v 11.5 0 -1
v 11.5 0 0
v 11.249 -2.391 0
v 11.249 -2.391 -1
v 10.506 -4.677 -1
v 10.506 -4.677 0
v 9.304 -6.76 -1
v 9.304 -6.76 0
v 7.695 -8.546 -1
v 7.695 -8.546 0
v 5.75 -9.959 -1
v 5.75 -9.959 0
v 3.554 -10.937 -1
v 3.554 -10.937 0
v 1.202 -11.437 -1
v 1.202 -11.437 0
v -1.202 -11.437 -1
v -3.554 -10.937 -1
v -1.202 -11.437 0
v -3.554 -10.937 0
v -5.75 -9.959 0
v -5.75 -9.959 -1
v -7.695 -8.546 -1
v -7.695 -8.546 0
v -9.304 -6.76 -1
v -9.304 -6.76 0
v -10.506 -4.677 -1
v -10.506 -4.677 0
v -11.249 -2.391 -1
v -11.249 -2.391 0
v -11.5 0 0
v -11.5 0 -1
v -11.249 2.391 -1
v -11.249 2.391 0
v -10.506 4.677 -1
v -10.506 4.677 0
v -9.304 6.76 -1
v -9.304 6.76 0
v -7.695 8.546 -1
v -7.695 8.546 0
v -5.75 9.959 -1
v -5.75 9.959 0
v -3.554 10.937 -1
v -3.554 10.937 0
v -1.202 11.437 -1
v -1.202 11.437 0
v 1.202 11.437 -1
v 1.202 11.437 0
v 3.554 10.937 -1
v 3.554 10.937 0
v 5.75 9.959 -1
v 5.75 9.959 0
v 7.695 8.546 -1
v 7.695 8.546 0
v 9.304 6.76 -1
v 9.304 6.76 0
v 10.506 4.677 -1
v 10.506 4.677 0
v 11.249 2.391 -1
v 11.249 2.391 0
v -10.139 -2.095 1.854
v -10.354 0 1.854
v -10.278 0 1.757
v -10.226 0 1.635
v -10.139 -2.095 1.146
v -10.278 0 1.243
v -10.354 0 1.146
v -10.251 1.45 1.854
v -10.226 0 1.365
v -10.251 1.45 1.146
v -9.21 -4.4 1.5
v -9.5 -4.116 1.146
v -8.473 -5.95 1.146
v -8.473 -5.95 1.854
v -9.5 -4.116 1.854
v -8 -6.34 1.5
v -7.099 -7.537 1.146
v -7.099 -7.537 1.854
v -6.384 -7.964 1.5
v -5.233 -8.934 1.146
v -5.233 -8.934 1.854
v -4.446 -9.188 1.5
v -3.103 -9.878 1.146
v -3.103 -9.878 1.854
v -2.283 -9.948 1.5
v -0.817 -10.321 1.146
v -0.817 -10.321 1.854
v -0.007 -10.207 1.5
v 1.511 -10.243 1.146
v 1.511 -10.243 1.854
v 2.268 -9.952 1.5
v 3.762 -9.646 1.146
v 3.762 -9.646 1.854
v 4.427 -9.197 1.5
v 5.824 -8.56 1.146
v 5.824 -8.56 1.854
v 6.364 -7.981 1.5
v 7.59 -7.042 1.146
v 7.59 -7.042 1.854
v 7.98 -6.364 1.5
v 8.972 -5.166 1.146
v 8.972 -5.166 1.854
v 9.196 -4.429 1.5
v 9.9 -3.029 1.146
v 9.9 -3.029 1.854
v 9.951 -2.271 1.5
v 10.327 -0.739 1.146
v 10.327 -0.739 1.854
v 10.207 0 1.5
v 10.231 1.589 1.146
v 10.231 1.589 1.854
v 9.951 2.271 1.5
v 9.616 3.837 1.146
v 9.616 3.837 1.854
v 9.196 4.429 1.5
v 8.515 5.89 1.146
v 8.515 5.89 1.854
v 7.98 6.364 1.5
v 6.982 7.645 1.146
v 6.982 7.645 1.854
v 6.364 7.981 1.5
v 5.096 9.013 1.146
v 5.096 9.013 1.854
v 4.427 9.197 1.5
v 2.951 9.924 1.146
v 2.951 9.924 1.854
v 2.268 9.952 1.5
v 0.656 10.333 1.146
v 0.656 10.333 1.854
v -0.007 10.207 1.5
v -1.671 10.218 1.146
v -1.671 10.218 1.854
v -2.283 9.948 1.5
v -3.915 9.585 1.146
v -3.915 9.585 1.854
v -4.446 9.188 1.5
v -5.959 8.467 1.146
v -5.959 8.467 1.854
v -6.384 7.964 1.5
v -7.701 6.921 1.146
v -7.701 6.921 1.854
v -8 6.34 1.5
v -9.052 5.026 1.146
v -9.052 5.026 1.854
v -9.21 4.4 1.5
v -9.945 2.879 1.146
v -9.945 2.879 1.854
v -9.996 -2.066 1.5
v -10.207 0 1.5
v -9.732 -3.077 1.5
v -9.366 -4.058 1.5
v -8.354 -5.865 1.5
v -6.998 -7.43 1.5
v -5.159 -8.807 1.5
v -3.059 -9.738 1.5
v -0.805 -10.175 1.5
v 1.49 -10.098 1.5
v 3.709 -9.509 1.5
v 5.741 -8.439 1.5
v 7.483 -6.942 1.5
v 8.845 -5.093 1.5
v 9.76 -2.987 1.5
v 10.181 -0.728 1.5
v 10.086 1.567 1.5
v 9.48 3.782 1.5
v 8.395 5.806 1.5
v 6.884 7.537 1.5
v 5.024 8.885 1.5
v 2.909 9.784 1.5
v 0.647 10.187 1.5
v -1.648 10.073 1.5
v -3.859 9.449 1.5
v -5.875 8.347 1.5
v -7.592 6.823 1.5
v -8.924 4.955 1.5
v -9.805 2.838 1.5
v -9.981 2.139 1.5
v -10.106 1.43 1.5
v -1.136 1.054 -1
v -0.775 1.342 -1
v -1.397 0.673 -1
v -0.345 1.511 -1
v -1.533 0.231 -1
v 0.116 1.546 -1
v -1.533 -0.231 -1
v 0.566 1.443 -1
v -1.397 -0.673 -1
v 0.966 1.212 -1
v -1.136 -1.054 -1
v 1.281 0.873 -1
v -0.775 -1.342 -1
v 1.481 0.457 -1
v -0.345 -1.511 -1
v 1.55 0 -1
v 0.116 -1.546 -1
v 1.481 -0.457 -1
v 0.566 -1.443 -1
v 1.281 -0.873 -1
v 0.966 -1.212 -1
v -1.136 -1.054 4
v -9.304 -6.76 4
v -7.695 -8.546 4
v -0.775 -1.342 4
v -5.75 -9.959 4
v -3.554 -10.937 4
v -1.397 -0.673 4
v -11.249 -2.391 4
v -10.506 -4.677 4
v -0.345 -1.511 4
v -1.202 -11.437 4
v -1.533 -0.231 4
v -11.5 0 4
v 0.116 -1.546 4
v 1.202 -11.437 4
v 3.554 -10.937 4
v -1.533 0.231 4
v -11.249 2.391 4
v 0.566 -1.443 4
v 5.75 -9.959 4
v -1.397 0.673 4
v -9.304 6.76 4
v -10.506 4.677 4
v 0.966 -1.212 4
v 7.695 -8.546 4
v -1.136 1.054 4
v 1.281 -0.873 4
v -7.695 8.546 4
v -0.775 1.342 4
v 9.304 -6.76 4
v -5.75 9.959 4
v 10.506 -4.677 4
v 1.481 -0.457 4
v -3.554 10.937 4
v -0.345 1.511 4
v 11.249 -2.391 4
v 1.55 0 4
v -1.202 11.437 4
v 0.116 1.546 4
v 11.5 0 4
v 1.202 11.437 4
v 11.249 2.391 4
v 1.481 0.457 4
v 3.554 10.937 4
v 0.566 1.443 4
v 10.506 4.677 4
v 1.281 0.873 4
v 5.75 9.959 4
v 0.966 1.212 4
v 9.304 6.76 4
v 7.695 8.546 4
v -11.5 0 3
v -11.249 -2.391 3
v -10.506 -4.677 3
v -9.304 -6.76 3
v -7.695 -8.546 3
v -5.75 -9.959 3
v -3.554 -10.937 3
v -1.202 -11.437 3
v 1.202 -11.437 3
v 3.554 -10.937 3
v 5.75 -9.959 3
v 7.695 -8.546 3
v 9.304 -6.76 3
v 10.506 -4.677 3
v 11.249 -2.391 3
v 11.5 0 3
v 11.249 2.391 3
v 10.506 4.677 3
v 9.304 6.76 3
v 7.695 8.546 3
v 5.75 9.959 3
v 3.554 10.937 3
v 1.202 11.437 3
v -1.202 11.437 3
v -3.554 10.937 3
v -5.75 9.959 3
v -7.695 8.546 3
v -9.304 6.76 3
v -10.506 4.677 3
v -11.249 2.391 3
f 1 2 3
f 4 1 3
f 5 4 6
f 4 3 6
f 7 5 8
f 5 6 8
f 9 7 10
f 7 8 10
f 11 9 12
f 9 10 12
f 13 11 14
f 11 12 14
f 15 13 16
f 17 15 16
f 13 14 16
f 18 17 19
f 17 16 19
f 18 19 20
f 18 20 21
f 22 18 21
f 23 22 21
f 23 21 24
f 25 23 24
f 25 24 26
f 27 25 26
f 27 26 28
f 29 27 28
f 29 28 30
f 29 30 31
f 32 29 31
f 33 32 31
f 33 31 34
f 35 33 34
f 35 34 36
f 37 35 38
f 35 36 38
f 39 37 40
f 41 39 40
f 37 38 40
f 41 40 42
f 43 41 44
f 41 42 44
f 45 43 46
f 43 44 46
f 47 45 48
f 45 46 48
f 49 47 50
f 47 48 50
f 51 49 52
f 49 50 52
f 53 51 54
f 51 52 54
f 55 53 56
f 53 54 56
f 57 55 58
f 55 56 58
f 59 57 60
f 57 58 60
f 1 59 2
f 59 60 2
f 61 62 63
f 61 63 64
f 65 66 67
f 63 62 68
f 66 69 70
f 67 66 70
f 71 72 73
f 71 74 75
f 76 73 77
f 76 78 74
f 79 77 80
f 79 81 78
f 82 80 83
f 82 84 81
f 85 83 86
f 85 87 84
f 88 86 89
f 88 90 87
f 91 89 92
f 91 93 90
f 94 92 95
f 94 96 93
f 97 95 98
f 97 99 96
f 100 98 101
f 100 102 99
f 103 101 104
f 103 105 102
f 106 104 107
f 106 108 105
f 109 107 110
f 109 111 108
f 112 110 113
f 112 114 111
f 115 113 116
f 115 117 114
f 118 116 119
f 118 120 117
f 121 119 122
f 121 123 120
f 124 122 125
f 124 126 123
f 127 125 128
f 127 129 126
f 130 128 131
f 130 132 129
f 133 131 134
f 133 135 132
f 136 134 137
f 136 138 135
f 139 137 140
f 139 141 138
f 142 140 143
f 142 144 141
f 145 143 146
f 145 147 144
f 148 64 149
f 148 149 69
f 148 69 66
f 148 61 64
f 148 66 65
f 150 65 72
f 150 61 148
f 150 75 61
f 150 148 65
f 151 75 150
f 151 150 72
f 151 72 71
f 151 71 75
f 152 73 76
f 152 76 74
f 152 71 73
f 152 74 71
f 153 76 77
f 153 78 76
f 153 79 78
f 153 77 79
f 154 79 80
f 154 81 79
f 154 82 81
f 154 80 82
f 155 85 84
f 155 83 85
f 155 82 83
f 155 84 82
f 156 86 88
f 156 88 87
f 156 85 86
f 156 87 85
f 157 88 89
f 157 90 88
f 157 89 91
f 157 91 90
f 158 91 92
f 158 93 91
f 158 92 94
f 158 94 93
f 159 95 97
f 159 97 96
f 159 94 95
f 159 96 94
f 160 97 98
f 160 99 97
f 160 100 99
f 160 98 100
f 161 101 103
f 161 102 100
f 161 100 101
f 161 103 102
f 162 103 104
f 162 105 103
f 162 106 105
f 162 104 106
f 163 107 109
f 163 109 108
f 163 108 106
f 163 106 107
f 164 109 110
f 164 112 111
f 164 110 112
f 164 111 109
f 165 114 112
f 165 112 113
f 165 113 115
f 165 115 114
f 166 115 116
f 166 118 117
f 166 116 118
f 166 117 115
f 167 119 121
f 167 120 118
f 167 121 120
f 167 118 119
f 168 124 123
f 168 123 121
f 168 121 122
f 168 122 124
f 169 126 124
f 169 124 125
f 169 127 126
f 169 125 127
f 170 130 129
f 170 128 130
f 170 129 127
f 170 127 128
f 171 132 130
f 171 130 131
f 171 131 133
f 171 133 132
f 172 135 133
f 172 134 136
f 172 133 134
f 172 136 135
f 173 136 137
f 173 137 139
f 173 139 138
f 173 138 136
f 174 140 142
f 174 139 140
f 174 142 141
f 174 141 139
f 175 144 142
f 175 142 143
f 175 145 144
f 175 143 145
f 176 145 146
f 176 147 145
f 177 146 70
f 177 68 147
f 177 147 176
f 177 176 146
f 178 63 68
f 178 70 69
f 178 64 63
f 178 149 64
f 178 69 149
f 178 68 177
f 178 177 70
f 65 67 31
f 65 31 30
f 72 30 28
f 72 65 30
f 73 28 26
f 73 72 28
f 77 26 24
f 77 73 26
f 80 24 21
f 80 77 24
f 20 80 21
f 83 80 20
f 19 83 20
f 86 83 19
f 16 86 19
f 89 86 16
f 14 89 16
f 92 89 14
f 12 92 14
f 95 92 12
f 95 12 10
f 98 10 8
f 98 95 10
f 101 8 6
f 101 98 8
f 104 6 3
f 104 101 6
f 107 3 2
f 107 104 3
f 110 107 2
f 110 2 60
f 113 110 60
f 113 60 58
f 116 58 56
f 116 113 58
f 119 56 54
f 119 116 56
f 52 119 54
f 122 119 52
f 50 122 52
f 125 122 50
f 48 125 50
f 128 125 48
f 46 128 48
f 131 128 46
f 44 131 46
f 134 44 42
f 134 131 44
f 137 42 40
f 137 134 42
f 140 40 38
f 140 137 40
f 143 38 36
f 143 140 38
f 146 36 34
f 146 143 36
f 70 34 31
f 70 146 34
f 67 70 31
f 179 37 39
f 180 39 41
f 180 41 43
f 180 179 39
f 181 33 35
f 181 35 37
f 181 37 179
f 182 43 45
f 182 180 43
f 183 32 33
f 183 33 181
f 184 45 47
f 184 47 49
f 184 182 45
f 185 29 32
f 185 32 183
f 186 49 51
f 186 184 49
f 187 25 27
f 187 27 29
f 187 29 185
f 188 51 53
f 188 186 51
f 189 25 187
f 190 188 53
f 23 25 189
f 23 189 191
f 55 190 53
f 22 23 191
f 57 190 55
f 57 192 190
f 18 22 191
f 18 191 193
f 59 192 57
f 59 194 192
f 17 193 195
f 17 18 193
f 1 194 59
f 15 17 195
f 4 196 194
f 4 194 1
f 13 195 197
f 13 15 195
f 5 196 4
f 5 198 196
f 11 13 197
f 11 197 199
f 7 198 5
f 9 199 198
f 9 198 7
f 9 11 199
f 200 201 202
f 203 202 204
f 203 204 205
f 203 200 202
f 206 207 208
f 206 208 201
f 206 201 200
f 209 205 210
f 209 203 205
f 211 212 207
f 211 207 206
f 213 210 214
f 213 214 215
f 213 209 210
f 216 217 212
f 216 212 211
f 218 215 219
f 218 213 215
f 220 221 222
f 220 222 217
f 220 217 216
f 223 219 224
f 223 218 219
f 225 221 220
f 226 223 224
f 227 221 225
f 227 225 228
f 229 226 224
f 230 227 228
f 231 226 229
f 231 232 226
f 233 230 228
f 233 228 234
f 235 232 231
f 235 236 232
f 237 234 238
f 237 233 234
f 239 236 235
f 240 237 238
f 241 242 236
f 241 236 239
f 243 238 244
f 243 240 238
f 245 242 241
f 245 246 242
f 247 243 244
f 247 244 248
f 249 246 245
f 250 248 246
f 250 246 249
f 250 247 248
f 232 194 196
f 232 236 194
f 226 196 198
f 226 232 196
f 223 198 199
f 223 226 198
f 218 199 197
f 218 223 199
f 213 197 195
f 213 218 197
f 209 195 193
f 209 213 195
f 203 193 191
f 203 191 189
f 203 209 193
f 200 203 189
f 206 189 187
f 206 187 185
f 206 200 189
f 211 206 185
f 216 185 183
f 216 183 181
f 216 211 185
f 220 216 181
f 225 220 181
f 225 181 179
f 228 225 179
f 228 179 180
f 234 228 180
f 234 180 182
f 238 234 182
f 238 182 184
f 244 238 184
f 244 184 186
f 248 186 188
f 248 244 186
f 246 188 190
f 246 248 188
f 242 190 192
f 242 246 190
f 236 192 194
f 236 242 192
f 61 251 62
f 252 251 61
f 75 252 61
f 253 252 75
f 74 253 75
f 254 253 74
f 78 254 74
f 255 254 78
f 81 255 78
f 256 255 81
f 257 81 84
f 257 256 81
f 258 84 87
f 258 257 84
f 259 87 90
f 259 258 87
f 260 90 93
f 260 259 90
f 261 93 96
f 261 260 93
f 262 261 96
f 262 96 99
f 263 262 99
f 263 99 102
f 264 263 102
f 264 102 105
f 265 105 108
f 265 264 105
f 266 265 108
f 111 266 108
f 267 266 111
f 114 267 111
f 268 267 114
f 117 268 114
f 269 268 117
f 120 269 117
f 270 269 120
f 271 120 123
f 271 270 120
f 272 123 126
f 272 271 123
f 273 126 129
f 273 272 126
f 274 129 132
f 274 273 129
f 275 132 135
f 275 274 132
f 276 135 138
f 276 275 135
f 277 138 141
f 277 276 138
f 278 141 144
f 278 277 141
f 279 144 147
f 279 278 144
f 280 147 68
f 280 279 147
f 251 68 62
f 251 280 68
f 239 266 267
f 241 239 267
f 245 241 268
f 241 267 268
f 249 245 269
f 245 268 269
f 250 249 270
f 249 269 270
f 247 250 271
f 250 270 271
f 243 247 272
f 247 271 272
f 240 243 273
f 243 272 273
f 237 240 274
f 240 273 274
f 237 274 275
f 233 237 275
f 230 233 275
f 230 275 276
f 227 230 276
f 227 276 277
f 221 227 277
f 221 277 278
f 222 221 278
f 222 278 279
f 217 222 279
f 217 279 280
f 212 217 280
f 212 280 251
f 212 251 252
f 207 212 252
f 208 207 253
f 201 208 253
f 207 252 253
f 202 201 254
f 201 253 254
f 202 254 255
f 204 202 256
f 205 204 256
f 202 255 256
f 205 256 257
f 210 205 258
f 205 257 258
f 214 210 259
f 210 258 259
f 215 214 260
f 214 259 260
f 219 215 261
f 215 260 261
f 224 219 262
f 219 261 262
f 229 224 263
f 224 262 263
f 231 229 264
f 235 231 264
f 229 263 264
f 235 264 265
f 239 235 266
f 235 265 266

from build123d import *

# Parameters (mm, degrees)
F0_R        = 11.5
F0_R_2      = 1.55
F2_DEPTH    = 4
F2_FACE_R   = 11.5
F2_FACE_R_2 = 1.55
F4_DEPTH    = 1
F5_R        = 0.5


with BuildPart() as f2:
    # F0 (on Top) → F2 (new body)
    with BuildSketch(Plane.XY):
        Circle(F0_R)
        Circle(F0_R_2, mode=Mode.SUBTRACT)
    extrude(amount=F2_DEPTH)

    # F1 (on Front) → F3 (revolve, cut)
    with BuildSketch(Plane.XZ):
        Polygon((-11.5, 3), (-11.5, 0), (-10, 1.5), align=None)
    revolve(axis=Axis((0, 0, 1.929782), (0, 0, 1)), mode=Mode.SUBTRACT)

    # F2_face (on face) → F4 (join)
    with BuildSketch(Plane(origin=(0, 0, 0), x_dir=(1, 0, 0), z_dir=(0, 0, -1))):
        Circle(F2_FACE_R)
        Circle(F2_FACE_R_2, mode=Mode.SUBTRACT)
    extrude(amount=F4_DEPTH)

    # F5
    f5_edges = [f2.edges().sort_by_distance(p)[0] for p in [
        (10, 0, 1.5),
    ]]
    fillet(f5_edges, radius=F5_R)


solid = f2.part
